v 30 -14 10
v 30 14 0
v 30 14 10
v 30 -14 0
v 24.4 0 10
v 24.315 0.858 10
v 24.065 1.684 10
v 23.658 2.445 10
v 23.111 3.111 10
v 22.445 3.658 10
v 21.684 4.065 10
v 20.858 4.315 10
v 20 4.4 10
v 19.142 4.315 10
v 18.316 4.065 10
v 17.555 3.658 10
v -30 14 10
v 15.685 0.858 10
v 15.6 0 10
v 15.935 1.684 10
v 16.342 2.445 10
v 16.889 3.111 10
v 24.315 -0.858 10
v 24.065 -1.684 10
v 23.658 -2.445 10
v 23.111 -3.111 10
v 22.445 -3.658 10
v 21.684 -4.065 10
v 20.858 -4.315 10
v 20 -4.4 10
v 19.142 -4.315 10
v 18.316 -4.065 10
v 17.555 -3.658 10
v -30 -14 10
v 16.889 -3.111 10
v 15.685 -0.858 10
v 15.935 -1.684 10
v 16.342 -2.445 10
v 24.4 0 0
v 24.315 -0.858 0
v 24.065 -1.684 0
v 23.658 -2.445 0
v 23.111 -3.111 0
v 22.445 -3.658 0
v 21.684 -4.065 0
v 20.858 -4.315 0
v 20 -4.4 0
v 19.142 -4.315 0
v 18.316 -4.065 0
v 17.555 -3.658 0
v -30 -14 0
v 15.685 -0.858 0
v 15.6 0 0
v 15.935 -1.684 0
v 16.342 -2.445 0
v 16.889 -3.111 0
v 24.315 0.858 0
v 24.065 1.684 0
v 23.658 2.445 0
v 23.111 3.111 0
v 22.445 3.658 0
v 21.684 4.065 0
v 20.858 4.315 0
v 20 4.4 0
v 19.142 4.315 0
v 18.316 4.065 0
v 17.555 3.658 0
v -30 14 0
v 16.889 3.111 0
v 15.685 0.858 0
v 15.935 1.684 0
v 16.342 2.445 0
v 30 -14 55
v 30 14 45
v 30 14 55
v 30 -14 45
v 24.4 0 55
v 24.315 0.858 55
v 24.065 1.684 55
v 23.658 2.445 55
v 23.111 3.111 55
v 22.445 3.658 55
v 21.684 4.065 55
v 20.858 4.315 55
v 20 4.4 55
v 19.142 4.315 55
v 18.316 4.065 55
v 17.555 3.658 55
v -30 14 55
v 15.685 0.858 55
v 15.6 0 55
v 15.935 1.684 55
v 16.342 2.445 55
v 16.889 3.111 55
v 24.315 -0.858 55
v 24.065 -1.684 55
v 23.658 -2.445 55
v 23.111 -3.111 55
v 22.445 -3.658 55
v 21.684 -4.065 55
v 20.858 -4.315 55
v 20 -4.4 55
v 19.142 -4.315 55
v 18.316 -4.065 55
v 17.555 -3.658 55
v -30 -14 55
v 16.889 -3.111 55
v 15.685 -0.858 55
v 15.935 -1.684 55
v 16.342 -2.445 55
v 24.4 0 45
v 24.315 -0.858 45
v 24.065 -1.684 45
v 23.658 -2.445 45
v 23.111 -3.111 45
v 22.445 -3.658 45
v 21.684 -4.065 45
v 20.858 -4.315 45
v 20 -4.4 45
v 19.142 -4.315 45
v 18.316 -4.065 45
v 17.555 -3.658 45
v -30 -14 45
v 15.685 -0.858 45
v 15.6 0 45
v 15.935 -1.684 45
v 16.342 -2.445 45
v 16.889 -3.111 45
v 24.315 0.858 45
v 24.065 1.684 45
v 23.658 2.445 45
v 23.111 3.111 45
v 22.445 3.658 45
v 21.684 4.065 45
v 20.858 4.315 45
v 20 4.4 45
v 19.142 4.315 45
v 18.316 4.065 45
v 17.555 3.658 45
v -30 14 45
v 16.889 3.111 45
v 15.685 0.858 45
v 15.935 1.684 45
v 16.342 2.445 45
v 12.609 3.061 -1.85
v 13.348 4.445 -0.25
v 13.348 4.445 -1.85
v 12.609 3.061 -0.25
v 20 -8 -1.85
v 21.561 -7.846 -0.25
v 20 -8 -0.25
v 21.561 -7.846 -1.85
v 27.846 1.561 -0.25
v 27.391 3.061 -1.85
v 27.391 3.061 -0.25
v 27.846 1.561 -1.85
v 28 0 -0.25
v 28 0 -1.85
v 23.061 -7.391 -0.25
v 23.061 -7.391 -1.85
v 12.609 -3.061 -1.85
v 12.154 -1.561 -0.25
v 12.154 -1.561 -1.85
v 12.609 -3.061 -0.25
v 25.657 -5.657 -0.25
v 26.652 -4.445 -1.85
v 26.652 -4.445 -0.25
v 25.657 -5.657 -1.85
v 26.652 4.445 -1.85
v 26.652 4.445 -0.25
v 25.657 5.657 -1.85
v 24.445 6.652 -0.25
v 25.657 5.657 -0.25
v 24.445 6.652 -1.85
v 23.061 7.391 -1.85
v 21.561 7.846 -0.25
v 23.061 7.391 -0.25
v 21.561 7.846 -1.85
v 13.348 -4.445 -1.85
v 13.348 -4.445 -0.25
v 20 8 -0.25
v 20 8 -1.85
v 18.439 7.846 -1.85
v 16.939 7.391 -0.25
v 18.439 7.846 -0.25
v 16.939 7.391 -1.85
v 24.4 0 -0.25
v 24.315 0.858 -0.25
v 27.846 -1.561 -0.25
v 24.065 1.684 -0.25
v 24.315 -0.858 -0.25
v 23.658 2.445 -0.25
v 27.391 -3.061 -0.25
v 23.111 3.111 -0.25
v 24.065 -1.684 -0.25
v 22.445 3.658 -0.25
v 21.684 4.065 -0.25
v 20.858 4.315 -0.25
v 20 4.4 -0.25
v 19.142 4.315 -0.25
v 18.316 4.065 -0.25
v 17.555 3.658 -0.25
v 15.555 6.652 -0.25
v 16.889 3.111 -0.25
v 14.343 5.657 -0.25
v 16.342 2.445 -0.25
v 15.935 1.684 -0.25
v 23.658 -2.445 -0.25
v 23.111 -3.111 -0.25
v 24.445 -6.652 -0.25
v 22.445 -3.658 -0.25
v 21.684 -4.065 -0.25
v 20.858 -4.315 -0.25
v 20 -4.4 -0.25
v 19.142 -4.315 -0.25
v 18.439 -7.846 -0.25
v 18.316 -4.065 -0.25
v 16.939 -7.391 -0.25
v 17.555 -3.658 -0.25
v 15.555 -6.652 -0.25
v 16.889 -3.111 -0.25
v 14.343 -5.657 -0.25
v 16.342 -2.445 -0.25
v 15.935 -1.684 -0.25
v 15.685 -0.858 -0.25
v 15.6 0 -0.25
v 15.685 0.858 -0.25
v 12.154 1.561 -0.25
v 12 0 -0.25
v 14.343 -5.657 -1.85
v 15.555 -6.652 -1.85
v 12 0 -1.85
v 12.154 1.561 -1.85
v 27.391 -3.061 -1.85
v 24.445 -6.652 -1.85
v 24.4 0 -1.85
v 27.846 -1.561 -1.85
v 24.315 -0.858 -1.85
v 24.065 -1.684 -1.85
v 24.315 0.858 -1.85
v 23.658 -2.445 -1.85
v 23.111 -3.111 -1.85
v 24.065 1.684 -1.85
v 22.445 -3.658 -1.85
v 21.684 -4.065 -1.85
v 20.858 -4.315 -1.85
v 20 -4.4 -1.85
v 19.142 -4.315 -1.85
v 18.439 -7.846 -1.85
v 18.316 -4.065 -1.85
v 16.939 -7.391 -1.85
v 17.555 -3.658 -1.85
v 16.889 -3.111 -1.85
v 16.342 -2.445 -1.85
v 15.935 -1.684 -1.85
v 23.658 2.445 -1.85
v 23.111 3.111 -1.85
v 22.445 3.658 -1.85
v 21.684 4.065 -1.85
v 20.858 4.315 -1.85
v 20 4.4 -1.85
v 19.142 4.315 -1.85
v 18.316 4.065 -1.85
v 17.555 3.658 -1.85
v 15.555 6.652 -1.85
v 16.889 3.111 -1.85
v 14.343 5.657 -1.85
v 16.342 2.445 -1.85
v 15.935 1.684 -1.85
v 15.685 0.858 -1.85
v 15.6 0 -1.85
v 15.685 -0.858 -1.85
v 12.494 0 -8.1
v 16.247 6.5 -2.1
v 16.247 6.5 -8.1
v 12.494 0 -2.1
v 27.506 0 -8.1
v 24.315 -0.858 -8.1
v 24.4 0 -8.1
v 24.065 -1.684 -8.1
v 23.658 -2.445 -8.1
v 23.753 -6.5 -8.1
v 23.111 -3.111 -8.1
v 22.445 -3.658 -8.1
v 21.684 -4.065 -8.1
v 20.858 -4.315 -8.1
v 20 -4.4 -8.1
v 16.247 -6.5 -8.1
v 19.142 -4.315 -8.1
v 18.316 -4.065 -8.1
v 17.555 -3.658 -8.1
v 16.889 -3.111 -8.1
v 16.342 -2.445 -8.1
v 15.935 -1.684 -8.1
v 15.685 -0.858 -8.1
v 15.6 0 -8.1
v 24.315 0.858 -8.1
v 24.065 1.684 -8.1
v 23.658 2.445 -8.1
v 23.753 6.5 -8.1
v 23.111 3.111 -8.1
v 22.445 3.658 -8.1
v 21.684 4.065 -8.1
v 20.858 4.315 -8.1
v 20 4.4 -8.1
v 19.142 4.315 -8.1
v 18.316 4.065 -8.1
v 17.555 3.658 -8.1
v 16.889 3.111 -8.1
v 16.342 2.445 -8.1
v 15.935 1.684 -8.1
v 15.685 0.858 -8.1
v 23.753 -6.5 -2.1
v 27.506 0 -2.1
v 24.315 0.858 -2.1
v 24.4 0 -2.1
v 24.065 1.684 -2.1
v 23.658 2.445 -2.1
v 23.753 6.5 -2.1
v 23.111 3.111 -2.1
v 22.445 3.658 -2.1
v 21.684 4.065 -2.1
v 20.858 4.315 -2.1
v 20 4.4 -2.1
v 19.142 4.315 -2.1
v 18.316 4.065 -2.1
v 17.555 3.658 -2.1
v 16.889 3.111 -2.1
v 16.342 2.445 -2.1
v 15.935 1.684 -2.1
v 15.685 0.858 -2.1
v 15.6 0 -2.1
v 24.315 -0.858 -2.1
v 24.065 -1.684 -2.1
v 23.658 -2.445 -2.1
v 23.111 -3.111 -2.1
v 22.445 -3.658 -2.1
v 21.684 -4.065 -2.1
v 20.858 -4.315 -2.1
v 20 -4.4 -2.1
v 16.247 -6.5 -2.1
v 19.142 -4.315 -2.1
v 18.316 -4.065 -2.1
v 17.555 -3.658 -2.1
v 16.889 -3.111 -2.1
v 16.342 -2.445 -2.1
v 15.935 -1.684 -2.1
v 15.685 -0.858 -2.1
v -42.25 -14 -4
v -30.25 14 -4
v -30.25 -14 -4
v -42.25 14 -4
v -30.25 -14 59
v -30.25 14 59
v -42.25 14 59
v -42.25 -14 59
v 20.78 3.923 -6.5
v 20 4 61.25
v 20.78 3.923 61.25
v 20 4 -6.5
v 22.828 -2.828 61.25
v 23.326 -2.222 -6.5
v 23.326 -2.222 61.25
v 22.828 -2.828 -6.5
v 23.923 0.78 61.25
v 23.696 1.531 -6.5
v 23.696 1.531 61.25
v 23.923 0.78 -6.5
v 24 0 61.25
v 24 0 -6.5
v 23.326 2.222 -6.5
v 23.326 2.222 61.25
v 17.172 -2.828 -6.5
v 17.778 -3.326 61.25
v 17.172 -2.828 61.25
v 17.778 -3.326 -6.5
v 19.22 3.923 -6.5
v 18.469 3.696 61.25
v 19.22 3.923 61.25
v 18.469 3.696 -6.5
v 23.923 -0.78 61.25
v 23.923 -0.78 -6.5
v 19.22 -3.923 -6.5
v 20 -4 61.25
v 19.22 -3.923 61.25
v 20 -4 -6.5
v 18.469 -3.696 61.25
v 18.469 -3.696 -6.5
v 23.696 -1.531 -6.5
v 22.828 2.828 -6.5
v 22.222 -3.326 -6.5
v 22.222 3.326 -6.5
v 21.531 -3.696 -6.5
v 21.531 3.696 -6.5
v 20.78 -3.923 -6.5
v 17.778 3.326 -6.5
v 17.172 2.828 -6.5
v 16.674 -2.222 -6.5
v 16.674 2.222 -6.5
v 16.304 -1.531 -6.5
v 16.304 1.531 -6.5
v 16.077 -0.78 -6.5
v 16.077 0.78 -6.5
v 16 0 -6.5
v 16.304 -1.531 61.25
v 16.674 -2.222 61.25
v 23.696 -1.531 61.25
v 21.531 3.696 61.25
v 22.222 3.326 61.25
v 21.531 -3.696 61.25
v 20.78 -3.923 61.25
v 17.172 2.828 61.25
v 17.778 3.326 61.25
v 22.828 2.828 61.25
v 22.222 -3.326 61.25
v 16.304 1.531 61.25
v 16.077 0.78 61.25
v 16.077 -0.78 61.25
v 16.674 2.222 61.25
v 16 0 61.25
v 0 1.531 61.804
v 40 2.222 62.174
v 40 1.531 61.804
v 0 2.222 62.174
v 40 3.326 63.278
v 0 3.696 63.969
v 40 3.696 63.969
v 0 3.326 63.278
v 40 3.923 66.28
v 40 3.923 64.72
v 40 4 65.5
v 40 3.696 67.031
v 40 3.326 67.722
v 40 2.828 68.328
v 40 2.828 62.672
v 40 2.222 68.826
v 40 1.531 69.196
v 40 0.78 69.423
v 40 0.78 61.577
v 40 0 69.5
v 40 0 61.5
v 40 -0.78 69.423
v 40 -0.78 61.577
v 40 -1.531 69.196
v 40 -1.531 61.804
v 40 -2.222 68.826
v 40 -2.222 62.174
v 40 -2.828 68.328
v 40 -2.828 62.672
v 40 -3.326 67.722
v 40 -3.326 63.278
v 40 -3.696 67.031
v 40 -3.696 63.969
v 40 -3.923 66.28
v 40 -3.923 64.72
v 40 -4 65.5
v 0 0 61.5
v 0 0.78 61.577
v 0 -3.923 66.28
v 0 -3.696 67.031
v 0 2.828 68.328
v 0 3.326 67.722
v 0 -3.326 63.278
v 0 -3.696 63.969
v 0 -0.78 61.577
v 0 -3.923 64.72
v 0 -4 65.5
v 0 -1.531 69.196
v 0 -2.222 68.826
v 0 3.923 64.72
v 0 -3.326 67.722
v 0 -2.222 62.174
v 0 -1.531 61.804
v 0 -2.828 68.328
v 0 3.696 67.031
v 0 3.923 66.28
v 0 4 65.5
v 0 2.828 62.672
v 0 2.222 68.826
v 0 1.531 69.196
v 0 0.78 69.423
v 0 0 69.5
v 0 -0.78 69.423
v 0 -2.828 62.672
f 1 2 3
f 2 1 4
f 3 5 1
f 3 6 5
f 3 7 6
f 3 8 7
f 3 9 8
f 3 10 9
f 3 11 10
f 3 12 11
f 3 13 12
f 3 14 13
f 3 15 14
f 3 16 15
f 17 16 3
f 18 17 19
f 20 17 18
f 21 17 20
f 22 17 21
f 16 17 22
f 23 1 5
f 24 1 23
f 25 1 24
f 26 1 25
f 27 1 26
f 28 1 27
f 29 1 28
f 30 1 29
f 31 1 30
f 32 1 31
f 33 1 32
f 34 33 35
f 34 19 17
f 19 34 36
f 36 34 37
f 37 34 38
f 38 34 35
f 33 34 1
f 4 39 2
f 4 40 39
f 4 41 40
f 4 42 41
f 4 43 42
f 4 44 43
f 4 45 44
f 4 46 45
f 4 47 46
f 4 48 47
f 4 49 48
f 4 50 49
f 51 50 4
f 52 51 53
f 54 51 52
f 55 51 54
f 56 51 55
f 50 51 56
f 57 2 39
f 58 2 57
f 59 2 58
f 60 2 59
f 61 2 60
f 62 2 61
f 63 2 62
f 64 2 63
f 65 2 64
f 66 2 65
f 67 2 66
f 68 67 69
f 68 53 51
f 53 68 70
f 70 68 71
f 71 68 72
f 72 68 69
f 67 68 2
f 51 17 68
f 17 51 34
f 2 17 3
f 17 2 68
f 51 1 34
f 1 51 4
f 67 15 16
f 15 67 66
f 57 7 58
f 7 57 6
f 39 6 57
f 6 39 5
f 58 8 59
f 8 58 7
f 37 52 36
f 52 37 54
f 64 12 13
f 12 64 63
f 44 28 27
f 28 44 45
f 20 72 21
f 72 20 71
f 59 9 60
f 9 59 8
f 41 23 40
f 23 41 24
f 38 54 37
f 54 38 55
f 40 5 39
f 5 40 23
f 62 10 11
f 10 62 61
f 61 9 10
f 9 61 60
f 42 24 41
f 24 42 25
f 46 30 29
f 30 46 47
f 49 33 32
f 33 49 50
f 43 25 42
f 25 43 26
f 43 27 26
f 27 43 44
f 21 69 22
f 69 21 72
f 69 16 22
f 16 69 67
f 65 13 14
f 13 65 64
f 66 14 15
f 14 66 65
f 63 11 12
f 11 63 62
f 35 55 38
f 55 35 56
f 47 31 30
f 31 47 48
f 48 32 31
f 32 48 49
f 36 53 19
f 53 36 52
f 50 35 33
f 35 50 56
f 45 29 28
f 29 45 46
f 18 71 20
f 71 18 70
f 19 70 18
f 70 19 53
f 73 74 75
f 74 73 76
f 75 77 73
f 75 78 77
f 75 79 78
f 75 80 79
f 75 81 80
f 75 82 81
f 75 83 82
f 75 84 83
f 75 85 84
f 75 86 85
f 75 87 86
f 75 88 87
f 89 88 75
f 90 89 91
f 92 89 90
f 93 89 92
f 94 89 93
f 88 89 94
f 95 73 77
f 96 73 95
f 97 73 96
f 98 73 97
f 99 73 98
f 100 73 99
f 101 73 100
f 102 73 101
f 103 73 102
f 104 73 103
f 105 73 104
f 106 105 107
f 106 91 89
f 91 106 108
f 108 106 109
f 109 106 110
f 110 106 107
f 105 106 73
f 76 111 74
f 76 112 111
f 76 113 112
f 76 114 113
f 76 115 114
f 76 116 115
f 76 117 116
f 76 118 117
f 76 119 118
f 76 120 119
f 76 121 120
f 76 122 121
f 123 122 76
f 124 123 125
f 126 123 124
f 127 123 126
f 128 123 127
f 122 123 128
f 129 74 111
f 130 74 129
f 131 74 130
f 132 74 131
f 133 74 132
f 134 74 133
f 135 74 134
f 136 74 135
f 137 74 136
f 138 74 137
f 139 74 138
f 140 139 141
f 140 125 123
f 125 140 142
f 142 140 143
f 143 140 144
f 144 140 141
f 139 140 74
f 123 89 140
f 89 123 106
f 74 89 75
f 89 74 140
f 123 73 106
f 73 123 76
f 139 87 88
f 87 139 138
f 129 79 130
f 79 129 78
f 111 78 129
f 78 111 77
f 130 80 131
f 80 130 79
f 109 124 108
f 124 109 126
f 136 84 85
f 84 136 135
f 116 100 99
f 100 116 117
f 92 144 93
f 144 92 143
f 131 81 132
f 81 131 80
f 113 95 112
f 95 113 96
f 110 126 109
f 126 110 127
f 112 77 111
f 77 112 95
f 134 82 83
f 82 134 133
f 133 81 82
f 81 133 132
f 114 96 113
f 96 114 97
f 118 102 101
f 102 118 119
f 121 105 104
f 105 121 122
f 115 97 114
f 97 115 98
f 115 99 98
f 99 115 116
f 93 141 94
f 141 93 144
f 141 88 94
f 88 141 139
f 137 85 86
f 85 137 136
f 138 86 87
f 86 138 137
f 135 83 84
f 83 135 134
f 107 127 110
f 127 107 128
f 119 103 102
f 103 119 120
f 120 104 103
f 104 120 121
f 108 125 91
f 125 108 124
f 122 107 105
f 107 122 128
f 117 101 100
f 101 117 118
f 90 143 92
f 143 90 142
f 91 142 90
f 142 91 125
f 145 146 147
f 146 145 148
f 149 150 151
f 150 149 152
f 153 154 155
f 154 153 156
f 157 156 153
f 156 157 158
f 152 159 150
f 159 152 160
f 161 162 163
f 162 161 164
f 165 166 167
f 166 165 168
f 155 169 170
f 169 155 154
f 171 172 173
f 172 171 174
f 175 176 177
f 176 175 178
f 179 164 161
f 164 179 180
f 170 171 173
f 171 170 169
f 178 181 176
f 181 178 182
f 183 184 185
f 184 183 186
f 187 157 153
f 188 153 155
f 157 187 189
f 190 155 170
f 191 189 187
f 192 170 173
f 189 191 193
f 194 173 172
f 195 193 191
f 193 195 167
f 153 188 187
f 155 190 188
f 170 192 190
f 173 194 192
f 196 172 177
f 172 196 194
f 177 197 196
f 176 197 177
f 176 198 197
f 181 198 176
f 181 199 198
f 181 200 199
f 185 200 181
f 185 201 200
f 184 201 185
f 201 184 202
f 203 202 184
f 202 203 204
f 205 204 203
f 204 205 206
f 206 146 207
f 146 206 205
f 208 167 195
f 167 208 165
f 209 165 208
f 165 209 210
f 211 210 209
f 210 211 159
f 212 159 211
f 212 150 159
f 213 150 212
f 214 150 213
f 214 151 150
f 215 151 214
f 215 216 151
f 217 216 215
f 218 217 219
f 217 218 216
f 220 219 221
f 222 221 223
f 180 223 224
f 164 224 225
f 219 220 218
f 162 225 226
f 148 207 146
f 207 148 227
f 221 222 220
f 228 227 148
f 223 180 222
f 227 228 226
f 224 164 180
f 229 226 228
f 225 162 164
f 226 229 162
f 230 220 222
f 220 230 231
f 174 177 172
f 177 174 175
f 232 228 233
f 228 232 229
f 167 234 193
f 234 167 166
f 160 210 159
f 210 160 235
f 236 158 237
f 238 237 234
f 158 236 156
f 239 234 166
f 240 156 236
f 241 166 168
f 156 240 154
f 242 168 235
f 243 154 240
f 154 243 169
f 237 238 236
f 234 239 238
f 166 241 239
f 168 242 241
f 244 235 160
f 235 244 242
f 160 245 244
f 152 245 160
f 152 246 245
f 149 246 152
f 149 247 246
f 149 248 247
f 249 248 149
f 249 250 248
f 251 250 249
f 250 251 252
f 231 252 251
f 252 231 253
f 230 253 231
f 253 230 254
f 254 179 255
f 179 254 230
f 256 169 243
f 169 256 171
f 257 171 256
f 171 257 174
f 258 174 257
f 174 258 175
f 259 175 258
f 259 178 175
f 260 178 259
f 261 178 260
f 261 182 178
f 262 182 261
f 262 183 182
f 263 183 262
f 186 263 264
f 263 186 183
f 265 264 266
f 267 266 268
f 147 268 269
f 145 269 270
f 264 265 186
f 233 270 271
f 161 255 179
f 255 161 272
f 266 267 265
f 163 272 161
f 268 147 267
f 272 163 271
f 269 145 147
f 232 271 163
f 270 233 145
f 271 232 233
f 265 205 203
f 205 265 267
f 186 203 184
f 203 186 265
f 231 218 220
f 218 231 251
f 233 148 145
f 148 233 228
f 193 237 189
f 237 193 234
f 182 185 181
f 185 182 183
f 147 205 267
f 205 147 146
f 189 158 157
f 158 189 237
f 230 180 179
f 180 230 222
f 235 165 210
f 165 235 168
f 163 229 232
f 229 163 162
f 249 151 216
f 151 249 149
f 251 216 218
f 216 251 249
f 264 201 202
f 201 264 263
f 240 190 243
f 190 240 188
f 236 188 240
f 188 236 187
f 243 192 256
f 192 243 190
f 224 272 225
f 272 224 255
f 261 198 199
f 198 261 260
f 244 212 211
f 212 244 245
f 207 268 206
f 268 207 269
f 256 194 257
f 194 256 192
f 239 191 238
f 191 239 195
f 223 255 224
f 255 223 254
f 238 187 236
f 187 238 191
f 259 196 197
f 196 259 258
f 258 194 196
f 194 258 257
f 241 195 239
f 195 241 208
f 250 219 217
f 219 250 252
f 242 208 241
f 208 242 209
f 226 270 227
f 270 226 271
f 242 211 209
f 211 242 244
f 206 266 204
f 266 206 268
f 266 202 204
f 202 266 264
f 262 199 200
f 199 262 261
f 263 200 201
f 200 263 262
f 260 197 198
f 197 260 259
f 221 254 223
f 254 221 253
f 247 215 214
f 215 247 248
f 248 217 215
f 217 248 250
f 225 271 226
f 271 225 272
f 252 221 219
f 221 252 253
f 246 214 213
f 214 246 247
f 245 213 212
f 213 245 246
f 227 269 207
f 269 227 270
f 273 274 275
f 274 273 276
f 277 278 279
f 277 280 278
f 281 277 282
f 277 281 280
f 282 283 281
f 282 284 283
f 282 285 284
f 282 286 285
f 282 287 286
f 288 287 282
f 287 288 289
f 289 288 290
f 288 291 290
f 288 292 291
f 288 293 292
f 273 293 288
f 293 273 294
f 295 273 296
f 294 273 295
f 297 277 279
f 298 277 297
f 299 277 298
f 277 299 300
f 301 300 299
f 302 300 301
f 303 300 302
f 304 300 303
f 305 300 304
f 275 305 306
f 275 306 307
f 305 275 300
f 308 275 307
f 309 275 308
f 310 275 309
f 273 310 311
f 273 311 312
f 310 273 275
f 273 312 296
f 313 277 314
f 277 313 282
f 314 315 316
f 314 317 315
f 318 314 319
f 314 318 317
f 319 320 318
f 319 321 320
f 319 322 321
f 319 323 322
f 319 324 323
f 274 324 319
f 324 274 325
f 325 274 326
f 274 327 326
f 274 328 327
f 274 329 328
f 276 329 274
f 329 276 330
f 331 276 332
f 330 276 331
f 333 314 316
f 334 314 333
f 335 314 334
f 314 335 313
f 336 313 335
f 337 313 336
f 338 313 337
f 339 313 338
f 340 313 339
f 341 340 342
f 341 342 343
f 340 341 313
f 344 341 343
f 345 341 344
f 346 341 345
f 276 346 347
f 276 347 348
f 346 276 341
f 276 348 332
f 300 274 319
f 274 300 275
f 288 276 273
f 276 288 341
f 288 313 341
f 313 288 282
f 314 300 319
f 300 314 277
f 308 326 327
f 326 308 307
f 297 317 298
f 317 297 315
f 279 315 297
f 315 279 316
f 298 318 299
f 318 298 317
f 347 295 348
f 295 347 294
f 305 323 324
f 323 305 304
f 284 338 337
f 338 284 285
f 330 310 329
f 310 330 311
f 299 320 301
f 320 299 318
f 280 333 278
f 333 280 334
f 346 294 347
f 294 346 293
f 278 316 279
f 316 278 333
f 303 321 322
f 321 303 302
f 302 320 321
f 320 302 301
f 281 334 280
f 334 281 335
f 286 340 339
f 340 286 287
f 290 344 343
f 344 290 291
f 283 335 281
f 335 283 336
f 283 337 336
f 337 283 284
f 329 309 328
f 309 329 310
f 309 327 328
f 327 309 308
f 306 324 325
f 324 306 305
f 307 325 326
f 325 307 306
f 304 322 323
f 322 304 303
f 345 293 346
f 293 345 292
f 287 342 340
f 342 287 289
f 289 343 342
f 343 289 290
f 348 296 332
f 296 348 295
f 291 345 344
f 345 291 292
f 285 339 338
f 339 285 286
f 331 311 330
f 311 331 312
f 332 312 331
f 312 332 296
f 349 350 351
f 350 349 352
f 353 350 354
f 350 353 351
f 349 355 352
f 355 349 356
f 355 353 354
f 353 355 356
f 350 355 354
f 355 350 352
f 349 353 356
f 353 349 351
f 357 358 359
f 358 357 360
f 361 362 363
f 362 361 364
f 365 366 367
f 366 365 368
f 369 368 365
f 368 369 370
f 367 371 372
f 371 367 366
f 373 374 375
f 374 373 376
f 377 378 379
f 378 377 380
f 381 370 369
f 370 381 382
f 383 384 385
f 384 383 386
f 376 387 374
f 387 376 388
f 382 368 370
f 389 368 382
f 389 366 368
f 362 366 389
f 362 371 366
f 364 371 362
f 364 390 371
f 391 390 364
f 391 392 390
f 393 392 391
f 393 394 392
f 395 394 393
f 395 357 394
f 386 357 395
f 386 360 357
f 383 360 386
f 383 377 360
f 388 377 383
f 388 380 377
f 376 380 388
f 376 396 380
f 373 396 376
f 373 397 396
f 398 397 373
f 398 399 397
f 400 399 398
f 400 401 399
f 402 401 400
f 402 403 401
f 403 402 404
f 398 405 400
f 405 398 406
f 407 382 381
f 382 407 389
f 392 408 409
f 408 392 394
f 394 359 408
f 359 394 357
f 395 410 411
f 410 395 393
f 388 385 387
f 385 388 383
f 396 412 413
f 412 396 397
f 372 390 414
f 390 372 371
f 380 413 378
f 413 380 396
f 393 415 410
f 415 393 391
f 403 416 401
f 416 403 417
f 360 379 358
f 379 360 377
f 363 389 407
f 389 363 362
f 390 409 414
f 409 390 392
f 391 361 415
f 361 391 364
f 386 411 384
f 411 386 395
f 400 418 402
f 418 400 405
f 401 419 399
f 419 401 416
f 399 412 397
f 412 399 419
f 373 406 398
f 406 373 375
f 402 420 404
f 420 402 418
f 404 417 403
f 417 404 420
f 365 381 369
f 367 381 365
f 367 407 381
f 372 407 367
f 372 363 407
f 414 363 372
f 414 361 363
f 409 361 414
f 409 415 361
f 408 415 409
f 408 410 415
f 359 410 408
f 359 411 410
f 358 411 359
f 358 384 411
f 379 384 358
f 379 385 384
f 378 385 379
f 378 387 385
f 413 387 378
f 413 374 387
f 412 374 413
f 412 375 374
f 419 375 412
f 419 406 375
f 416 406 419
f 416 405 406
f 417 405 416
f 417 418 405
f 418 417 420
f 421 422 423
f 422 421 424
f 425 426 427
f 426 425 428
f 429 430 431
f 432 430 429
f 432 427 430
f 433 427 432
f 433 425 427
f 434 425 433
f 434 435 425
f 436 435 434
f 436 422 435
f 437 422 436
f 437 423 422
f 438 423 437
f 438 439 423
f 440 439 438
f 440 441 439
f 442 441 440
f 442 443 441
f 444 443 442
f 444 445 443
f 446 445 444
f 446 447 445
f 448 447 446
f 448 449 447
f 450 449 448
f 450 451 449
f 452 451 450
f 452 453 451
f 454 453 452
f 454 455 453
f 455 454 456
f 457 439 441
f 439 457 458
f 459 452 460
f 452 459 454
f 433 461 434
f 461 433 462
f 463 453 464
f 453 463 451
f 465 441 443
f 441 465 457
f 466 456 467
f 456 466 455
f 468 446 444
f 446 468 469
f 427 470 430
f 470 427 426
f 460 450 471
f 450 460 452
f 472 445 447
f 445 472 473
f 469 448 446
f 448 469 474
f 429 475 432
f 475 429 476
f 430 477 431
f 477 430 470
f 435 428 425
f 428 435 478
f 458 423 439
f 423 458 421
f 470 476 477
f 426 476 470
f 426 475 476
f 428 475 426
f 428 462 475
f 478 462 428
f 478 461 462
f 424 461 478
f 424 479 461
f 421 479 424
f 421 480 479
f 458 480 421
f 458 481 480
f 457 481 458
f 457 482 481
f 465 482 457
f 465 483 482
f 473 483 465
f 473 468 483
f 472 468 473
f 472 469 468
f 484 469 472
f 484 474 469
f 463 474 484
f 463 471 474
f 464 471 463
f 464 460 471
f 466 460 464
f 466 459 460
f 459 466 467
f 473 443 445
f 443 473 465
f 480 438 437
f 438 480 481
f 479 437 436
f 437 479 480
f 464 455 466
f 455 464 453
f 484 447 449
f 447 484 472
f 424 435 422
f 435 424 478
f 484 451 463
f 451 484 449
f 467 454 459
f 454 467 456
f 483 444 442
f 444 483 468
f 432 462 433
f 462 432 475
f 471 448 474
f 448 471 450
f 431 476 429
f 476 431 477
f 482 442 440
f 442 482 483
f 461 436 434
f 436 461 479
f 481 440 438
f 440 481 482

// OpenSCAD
$fn = 32;

// ------------------------------------------------------------------------
// C clamp: throat 45 mm, screw d8
// Every part is its own module, assembly() places every instance.
// ------------------------------------------------------------------------

// --- part 1 ---
module clamp_arm() {
  difference() {
    translate([-30, -14, 0]) cube([60, 28, 10]);
    translate([20, 0, -1]) cylinder(h = 12, d = 8.8);
  }
}

// --- part 2 ---
module clamp_spine() {
  difference() {
    translate([-31.5, -14, 0]) cube([63, 28, 12]);
  }
}

// --- part 3 ---
module clamp_screw() {
  translate([0, 0, -33.875]) cylinder(h = 67.75, d = 8);
}

// --- part 4 ---
module clamp_washer() {
  difference() {
      translate([0, 0, 0]) cylinder(h = 1.6, d = 16);
      translate([0, 0, -1]) cylinder(h = 3.6, d = 8.8);
    }
}

// --- part 5 ---
module clamp_nut() {
  difference() {
    linear_extrude(height = 6) polygon(points = [[7.506, 0], [3.753, 6.5], [-3.753, 6.5], [-7.506, 0], [-3.753, -6.5], [3.753, -6.5]]);
    translate([0, 0, -1]) cylinder(h = 8, d = 8.8);
  }
}

// --- part 6 ---
module tommy_bar() {
  translate([0, 0, -20]) cylinder(h = 40, d = 8);
}

// --- assembly ---
module assembly() {
  color([0.80, 0.24, 0.20]) translate([0, 0, 0]) rotate([0, 0, 0]) clamp_arm();
  color([0.20, 0.45, 0.75]) translate([0, 0, 45]) rotate([0, 0, 0]) clamp_arm();
  color([0.25, 0.62, 0.32]) translate([-42.25, 0, 27.5]) rotate([0, 90, 0]) clamp_spine();
  color([0.92, 0.70, 0.18]) translate([20, 0, 27.375]) rotate([0, 0, 0]) clamp_screw();
  color([0.58, 0.35, 0.70]) translate([20, 0, -1.85]) rotate([0, 0, 0]) clamp_washer();
  color([0.16, 0.66, 0.66]) translate([20, 0, -8.1]) rotate([0, 0, 0]) clamp_nut();
  color([0.85, 0.48, 0.18]) translate([20, 0, 65.5]) rotate([0, 90, 0]) tommy_bar();
}

assembly();
